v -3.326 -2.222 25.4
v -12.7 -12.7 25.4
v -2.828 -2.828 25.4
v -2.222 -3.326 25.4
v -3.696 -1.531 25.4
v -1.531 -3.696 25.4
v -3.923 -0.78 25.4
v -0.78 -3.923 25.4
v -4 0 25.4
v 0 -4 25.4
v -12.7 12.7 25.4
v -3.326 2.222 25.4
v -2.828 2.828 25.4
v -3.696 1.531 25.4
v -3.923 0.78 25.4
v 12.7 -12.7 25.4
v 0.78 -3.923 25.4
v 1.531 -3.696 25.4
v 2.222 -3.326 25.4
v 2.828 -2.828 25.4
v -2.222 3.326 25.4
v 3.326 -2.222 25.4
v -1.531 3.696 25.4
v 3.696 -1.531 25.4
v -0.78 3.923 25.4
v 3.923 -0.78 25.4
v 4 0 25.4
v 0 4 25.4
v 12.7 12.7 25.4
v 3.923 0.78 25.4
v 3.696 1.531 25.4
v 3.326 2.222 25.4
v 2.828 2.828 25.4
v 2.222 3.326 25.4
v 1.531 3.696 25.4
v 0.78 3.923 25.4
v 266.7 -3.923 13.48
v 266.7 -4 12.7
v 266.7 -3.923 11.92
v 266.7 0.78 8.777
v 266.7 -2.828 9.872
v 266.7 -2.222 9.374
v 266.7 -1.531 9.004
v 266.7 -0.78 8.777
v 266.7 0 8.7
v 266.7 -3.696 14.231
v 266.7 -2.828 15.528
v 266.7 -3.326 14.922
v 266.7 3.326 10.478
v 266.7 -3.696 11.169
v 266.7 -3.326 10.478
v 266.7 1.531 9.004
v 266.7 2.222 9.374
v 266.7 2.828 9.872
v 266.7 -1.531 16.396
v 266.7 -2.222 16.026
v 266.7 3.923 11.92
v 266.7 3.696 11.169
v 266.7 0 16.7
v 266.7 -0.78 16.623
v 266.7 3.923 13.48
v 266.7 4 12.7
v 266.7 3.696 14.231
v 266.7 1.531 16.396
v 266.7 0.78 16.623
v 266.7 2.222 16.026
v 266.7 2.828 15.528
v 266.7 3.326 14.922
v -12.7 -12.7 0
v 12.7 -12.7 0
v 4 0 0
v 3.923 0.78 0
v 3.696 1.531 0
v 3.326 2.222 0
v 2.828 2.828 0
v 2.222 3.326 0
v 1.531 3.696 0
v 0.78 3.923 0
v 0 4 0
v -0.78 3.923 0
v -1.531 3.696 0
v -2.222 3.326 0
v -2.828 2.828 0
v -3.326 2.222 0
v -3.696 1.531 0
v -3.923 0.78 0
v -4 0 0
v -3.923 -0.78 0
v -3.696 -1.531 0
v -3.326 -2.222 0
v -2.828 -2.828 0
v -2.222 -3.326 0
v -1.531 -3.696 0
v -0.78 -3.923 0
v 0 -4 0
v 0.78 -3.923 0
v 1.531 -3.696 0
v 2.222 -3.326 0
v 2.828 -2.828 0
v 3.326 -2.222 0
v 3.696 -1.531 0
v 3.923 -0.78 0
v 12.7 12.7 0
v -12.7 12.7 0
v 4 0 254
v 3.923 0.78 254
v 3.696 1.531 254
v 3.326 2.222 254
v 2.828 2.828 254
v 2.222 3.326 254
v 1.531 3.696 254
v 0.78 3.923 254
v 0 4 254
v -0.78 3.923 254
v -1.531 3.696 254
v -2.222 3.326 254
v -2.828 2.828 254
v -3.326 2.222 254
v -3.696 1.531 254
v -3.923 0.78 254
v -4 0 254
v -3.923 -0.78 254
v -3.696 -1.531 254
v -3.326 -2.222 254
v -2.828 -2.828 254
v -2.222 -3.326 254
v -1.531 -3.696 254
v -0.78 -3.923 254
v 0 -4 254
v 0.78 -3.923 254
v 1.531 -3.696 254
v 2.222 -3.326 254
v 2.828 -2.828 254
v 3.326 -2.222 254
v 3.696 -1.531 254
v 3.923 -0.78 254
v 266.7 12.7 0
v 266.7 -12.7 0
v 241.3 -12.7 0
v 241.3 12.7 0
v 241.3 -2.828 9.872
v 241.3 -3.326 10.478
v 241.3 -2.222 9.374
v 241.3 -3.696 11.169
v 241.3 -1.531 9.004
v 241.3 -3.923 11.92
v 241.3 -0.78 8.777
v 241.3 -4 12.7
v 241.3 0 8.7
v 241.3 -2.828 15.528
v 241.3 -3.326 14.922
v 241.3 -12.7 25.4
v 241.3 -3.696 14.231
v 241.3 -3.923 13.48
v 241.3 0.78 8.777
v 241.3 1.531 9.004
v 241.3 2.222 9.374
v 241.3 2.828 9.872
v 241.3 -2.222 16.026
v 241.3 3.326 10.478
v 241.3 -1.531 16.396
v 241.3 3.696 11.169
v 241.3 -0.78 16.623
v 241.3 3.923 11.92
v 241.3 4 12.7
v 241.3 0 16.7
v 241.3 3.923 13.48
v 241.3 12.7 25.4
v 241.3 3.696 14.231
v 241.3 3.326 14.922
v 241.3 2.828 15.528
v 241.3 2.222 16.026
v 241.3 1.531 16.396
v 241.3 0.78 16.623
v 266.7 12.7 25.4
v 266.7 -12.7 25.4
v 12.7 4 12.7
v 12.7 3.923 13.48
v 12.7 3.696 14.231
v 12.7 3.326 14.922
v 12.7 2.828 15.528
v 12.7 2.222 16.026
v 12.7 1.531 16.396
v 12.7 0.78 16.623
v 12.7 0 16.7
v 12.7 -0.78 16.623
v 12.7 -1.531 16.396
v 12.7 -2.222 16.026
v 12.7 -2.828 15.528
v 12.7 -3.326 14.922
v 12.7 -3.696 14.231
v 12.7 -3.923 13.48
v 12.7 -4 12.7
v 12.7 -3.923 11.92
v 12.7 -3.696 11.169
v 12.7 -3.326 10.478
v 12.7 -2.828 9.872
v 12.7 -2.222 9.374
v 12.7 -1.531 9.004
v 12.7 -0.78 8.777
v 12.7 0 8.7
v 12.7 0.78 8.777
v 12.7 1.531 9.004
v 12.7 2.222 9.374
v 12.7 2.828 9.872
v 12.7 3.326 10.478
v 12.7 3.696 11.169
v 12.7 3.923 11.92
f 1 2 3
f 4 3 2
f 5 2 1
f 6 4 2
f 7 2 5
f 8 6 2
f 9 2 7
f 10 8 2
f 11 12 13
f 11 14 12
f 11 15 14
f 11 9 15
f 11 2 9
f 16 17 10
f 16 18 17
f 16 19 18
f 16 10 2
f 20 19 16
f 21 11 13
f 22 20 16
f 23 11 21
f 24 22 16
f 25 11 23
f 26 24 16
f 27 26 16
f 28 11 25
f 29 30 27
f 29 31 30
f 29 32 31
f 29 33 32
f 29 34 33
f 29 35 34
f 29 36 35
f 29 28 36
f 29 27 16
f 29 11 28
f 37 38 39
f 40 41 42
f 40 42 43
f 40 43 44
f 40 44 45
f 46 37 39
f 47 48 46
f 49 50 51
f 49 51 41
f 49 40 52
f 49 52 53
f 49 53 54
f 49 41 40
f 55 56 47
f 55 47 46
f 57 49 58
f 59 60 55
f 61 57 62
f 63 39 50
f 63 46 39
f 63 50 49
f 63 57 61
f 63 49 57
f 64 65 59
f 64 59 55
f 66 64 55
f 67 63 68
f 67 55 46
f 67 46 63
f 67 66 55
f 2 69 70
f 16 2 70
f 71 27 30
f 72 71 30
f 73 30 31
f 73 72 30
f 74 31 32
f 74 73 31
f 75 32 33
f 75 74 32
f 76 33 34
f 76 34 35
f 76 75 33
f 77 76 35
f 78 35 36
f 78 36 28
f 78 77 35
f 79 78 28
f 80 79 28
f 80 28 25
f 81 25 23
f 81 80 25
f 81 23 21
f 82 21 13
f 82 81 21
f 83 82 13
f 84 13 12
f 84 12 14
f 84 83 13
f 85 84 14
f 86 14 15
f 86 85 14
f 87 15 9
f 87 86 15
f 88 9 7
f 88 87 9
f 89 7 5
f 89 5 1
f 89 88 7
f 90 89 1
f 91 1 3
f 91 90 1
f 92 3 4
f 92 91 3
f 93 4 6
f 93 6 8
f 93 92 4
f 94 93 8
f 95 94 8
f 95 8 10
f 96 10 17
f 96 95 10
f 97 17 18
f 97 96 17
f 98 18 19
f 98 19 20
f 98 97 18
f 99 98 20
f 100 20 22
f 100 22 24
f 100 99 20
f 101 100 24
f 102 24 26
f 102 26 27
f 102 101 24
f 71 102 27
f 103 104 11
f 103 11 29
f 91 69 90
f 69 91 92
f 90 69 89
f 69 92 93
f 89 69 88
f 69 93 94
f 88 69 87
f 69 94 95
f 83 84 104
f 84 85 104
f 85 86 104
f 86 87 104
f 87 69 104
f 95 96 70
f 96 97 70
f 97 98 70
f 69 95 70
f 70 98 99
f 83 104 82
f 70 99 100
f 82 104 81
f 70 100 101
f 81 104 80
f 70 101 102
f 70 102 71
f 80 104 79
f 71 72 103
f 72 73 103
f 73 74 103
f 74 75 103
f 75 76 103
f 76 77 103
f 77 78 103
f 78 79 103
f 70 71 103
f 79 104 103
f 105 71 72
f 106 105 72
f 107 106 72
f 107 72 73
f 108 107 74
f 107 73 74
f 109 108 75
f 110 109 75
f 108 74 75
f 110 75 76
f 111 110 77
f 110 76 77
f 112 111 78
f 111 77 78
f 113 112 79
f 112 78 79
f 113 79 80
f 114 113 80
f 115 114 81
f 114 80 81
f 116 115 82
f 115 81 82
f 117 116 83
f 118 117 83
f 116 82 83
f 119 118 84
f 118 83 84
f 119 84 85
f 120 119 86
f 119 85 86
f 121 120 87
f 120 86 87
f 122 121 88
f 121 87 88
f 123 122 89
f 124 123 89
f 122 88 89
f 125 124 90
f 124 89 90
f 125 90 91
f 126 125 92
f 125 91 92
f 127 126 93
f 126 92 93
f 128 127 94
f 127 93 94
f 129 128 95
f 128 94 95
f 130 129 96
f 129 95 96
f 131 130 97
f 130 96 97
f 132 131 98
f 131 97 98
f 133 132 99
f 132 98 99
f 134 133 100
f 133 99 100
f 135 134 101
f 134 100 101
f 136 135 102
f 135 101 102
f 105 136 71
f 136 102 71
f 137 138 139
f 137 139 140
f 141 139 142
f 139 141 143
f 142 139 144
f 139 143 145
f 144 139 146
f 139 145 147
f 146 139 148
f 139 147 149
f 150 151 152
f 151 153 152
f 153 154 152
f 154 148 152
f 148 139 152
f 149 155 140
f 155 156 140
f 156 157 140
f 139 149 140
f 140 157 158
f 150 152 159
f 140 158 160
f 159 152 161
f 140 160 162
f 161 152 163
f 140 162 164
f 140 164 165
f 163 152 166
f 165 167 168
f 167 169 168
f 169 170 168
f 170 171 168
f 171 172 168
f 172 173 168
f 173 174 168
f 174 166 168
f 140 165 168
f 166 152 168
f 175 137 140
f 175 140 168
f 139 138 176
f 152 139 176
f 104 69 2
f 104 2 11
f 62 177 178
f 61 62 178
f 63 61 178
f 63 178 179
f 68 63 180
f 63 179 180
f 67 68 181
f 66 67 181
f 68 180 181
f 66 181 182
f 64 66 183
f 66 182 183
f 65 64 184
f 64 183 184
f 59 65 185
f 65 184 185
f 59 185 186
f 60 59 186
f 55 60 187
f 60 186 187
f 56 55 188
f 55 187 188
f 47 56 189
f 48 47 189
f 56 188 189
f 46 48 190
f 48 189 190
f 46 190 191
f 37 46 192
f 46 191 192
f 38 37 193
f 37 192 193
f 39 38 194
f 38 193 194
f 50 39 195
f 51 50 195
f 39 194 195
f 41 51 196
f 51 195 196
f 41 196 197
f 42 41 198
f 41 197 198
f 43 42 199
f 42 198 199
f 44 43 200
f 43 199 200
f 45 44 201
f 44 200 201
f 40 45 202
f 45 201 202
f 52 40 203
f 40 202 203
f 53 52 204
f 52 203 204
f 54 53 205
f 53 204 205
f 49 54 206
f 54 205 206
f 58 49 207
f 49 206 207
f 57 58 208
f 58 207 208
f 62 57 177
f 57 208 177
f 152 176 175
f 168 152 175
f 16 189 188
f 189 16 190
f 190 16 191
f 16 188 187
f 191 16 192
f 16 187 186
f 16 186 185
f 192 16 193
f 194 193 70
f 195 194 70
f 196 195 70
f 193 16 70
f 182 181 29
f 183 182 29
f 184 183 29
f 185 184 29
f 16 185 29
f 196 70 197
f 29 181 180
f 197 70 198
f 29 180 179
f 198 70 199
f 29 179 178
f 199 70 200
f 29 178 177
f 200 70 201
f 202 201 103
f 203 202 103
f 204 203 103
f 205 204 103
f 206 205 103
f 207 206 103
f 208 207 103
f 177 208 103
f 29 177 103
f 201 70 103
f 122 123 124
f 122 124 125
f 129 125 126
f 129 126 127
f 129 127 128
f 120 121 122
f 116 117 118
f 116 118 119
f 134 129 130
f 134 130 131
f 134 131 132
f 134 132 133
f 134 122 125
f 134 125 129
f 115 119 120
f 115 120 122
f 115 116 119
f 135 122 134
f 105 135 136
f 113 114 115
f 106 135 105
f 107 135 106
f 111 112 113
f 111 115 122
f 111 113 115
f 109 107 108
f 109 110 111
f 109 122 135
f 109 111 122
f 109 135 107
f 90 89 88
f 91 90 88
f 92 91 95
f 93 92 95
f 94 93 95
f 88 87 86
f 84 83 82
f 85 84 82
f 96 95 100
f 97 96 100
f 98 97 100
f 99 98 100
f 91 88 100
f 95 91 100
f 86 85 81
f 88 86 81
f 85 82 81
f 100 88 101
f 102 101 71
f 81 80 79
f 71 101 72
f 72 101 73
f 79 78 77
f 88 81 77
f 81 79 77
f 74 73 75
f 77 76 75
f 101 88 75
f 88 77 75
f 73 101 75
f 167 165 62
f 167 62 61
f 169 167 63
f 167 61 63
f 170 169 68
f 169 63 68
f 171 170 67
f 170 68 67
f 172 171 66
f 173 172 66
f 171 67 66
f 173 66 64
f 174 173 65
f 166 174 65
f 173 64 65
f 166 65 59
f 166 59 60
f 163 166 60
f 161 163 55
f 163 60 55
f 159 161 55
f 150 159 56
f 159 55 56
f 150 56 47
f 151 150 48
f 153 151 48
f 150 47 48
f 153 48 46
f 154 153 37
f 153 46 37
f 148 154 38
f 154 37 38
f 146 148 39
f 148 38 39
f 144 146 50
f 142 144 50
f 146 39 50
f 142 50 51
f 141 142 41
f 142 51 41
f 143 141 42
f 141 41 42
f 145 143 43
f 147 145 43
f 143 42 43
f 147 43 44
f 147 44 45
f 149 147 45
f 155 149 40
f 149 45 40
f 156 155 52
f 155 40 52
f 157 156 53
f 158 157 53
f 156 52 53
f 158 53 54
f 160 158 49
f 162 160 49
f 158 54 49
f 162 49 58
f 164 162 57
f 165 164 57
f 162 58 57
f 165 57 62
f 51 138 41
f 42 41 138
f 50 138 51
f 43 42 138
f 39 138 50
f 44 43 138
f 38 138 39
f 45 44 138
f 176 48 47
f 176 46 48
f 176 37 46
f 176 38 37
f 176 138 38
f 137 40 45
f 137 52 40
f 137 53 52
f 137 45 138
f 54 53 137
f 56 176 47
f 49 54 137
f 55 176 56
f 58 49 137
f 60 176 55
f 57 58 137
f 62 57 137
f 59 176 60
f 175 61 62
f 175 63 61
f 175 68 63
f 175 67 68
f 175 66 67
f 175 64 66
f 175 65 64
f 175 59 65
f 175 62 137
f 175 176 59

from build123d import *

# Parameters (mm, degrees)
F0_R     = 4
F1_DEPTH = 254
F2_W     = 25.4
F2_H     = 25.4
F2_R     = 4
F3_DEPTH = 25.4
F4_R     = 4
F5_DEPTH = 254
F6_W     = 25.4
F6_H     = 25.4
F6_R     = 4
F7_DEPTH = 25.4


with BuildPart() as f1:
    # F0 (on Top) → F1 (new body)
    with BuildSketch(Plane.XY):
        Circle(F0_R)
    extrude(amount=F1_DEPTH)


with BuildPart() as f3:
    # F2 (on Top) → F3 (new body)
    with BuildSketch(Plane.XY):
        Rectangle(F2_W, F2_H)
        Circle(F2_R, mode=Mode.SUBTRACT)
    extrude(amount=F3_DEPTH)

    # F4 (on face) → F5 (join)
    with BuildSketch(Plane.YZ.offset(12.7)):
        with Locations((0, 12.7)):
            Circle(F4_R)
    extrude(amount=F5_DEPTH)


with BuildPart() as f7:
    # F6 (on face) → F7 (new body)
    with BuildSketch(Plane.YZ.offset(266.7)):
        with Locations((0, 12.7)):
            Rectangle(F6_W, F6_H)
        with Locations((0, 12.7)):
            Circle(F6_R, mode=Mode.SUBTRACT)
    extrude(amount=-F7_DEPTH)


solid = Compound([f1.part, f3.part, f7.part])
